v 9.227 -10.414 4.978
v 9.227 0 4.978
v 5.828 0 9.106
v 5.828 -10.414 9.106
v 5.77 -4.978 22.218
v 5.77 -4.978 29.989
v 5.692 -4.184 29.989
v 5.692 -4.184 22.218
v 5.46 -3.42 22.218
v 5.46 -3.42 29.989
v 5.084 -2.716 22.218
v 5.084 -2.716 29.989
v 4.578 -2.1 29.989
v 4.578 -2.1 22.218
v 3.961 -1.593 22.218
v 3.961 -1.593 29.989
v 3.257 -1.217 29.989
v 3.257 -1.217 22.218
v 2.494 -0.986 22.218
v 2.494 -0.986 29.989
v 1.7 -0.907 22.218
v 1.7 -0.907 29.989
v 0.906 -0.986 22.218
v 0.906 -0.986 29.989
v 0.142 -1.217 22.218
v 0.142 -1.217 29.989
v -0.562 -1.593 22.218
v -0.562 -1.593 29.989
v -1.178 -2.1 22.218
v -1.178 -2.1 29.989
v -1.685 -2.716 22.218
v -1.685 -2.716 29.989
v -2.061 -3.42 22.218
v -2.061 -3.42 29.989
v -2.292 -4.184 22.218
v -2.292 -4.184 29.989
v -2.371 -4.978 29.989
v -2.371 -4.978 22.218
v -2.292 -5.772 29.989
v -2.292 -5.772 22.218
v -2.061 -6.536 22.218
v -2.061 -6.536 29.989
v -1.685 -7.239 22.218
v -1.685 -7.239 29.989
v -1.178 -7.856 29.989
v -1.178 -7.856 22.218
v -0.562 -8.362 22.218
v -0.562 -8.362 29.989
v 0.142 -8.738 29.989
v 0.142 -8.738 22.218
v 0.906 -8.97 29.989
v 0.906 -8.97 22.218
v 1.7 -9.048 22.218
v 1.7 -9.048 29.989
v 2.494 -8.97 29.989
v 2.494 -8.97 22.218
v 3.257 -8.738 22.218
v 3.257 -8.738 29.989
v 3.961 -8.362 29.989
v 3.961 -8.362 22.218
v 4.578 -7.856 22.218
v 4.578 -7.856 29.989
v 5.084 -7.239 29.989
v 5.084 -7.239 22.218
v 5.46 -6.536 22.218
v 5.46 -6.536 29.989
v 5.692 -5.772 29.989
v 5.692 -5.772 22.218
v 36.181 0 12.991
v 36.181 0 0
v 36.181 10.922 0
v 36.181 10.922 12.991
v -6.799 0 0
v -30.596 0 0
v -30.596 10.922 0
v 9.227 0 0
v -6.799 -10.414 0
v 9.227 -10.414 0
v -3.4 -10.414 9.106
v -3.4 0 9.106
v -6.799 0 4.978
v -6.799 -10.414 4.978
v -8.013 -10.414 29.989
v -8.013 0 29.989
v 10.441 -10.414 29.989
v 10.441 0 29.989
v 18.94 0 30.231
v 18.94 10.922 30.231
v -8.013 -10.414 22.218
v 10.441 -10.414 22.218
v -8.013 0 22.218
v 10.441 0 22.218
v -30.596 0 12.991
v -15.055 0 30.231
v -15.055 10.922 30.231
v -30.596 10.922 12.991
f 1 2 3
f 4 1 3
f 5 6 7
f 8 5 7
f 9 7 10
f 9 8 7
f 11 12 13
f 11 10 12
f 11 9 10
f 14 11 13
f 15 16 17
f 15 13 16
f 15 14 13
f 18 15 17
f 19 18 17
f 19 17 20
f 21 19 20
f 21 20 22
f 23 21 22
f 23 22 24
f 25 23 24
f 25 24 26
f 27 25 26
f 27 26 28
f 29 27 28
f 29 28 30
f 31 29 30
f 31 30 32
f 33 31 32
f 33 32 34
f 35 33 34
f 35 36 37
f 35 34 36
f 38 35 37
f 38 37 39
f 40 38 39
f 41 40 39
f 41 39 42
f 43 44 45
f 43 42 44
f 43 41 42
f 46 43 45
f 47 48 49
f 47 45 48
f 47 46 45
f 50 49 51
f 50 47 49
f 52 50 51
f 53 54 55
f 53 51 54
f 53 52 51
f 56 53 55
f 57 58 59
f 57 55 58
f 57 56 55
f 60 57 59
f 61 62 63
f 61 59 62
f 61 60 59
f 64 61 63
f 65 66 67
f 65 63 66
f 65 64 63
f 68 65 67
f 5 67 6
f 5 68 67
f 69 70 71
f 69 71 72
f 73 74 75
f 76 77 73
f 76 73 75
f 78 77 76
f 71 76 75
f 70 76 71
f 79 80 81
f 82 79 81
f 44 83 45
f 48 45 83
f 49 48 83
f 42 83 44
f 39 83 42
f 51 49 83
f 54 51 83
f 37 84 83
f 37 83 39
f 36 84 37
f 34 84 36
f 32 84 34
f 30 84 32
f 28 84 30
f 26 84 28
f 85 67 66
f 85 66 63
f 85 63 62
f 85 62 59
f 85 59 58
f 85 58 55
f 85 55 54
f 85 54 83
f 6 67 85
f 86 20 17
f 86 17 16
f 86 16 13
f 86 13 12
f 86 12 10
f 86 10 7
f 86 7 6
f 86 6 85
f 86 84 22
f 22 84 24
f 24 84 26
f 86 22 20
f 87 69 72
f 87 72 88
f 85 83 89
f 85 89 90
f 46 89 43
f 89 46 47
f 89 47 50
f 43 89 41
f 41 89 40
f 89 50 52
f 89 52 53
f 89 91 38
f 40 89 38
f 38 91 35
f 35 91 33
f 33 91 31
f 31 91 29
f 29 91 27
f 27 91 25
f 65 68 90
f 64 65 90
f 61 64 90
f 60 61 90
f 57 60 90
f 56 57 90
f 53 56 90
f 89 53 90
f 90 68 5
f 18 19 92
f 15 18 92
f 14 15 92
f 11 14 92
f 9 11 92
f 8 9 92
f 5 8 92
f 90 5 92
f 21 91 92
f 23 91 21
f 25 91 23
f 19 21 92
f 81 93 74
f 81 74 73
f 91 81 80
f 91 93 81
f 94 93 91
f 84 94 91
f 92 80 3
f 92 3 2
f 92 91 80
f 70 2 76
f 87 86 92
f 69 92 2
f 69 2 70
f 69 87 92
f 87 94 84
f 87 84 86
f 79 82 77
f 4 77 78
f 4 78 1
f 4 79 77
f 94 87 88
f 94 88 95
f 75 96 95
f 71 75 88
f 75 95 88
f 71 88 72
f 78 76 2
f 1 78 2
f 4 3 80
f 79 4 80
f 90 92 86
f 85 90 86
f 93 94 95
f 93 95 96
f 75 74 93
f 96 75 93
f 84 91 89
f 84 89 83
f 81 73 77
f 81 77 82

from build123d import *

# Parameters (mm, degrees)
F0_W     = 66.776178
F0_H     = 12.991002
F1_DEPTH = 10.922
F2_W     = 18.454506
F2_H     = 7.770319
F3_DEPTH = 10.414
F4_R     = 4.070445
F5_DEPTH = 37.846
F6_W     = 16.026282
F6_H     = 4.97786
F7_DEPTH = 10.414


with BuildPart() as f1:
    # F0 (on Front) → F1 (new body)
    with BuildSketch(Plane.XZ):
        with Locations((2.792459, 6.495501)):
            Rectangle(F0_W, F0_H)
        Polygon((-15.054992, 30.231398), (-30.59563, 12.991002), (36.180548, 12.991002), (18.940151, 30.231398), align=None)
    extrude(amount=-F1_DEPTH)

    # F2 (on Front) → F3 (join)
    with BuildSketch(Plane.XZ):
        with Locations((1.214112, 26.103414)):
            Rectangle(F2_W, F2_H)
    extrude(amount=F3_DEPTH)

    # F4 (on Top) → F5 (cut)
    with BuildSketch(Plane.XY):
        with Locations((1.699758, -4.97786)):
            Circle(F4_R)
    extrude(amount=F5_DEPTH, mode=Mode.SUBTRACT)

    # F6 (on Front) → F7 (join)
    with BuildSketch(Plane.XZ):
        with Locations((1.214112, 2.48893)):
            Rectangle(F6_W, F6_H)
        Polygon((-3.399515, 9.105843), (-6.799029, 4.97786), (9.227253, 4.97786), (5.827739, 9.105843), align=None)
    extrude(amount=F7_DEPTH)


solid = f1.part
